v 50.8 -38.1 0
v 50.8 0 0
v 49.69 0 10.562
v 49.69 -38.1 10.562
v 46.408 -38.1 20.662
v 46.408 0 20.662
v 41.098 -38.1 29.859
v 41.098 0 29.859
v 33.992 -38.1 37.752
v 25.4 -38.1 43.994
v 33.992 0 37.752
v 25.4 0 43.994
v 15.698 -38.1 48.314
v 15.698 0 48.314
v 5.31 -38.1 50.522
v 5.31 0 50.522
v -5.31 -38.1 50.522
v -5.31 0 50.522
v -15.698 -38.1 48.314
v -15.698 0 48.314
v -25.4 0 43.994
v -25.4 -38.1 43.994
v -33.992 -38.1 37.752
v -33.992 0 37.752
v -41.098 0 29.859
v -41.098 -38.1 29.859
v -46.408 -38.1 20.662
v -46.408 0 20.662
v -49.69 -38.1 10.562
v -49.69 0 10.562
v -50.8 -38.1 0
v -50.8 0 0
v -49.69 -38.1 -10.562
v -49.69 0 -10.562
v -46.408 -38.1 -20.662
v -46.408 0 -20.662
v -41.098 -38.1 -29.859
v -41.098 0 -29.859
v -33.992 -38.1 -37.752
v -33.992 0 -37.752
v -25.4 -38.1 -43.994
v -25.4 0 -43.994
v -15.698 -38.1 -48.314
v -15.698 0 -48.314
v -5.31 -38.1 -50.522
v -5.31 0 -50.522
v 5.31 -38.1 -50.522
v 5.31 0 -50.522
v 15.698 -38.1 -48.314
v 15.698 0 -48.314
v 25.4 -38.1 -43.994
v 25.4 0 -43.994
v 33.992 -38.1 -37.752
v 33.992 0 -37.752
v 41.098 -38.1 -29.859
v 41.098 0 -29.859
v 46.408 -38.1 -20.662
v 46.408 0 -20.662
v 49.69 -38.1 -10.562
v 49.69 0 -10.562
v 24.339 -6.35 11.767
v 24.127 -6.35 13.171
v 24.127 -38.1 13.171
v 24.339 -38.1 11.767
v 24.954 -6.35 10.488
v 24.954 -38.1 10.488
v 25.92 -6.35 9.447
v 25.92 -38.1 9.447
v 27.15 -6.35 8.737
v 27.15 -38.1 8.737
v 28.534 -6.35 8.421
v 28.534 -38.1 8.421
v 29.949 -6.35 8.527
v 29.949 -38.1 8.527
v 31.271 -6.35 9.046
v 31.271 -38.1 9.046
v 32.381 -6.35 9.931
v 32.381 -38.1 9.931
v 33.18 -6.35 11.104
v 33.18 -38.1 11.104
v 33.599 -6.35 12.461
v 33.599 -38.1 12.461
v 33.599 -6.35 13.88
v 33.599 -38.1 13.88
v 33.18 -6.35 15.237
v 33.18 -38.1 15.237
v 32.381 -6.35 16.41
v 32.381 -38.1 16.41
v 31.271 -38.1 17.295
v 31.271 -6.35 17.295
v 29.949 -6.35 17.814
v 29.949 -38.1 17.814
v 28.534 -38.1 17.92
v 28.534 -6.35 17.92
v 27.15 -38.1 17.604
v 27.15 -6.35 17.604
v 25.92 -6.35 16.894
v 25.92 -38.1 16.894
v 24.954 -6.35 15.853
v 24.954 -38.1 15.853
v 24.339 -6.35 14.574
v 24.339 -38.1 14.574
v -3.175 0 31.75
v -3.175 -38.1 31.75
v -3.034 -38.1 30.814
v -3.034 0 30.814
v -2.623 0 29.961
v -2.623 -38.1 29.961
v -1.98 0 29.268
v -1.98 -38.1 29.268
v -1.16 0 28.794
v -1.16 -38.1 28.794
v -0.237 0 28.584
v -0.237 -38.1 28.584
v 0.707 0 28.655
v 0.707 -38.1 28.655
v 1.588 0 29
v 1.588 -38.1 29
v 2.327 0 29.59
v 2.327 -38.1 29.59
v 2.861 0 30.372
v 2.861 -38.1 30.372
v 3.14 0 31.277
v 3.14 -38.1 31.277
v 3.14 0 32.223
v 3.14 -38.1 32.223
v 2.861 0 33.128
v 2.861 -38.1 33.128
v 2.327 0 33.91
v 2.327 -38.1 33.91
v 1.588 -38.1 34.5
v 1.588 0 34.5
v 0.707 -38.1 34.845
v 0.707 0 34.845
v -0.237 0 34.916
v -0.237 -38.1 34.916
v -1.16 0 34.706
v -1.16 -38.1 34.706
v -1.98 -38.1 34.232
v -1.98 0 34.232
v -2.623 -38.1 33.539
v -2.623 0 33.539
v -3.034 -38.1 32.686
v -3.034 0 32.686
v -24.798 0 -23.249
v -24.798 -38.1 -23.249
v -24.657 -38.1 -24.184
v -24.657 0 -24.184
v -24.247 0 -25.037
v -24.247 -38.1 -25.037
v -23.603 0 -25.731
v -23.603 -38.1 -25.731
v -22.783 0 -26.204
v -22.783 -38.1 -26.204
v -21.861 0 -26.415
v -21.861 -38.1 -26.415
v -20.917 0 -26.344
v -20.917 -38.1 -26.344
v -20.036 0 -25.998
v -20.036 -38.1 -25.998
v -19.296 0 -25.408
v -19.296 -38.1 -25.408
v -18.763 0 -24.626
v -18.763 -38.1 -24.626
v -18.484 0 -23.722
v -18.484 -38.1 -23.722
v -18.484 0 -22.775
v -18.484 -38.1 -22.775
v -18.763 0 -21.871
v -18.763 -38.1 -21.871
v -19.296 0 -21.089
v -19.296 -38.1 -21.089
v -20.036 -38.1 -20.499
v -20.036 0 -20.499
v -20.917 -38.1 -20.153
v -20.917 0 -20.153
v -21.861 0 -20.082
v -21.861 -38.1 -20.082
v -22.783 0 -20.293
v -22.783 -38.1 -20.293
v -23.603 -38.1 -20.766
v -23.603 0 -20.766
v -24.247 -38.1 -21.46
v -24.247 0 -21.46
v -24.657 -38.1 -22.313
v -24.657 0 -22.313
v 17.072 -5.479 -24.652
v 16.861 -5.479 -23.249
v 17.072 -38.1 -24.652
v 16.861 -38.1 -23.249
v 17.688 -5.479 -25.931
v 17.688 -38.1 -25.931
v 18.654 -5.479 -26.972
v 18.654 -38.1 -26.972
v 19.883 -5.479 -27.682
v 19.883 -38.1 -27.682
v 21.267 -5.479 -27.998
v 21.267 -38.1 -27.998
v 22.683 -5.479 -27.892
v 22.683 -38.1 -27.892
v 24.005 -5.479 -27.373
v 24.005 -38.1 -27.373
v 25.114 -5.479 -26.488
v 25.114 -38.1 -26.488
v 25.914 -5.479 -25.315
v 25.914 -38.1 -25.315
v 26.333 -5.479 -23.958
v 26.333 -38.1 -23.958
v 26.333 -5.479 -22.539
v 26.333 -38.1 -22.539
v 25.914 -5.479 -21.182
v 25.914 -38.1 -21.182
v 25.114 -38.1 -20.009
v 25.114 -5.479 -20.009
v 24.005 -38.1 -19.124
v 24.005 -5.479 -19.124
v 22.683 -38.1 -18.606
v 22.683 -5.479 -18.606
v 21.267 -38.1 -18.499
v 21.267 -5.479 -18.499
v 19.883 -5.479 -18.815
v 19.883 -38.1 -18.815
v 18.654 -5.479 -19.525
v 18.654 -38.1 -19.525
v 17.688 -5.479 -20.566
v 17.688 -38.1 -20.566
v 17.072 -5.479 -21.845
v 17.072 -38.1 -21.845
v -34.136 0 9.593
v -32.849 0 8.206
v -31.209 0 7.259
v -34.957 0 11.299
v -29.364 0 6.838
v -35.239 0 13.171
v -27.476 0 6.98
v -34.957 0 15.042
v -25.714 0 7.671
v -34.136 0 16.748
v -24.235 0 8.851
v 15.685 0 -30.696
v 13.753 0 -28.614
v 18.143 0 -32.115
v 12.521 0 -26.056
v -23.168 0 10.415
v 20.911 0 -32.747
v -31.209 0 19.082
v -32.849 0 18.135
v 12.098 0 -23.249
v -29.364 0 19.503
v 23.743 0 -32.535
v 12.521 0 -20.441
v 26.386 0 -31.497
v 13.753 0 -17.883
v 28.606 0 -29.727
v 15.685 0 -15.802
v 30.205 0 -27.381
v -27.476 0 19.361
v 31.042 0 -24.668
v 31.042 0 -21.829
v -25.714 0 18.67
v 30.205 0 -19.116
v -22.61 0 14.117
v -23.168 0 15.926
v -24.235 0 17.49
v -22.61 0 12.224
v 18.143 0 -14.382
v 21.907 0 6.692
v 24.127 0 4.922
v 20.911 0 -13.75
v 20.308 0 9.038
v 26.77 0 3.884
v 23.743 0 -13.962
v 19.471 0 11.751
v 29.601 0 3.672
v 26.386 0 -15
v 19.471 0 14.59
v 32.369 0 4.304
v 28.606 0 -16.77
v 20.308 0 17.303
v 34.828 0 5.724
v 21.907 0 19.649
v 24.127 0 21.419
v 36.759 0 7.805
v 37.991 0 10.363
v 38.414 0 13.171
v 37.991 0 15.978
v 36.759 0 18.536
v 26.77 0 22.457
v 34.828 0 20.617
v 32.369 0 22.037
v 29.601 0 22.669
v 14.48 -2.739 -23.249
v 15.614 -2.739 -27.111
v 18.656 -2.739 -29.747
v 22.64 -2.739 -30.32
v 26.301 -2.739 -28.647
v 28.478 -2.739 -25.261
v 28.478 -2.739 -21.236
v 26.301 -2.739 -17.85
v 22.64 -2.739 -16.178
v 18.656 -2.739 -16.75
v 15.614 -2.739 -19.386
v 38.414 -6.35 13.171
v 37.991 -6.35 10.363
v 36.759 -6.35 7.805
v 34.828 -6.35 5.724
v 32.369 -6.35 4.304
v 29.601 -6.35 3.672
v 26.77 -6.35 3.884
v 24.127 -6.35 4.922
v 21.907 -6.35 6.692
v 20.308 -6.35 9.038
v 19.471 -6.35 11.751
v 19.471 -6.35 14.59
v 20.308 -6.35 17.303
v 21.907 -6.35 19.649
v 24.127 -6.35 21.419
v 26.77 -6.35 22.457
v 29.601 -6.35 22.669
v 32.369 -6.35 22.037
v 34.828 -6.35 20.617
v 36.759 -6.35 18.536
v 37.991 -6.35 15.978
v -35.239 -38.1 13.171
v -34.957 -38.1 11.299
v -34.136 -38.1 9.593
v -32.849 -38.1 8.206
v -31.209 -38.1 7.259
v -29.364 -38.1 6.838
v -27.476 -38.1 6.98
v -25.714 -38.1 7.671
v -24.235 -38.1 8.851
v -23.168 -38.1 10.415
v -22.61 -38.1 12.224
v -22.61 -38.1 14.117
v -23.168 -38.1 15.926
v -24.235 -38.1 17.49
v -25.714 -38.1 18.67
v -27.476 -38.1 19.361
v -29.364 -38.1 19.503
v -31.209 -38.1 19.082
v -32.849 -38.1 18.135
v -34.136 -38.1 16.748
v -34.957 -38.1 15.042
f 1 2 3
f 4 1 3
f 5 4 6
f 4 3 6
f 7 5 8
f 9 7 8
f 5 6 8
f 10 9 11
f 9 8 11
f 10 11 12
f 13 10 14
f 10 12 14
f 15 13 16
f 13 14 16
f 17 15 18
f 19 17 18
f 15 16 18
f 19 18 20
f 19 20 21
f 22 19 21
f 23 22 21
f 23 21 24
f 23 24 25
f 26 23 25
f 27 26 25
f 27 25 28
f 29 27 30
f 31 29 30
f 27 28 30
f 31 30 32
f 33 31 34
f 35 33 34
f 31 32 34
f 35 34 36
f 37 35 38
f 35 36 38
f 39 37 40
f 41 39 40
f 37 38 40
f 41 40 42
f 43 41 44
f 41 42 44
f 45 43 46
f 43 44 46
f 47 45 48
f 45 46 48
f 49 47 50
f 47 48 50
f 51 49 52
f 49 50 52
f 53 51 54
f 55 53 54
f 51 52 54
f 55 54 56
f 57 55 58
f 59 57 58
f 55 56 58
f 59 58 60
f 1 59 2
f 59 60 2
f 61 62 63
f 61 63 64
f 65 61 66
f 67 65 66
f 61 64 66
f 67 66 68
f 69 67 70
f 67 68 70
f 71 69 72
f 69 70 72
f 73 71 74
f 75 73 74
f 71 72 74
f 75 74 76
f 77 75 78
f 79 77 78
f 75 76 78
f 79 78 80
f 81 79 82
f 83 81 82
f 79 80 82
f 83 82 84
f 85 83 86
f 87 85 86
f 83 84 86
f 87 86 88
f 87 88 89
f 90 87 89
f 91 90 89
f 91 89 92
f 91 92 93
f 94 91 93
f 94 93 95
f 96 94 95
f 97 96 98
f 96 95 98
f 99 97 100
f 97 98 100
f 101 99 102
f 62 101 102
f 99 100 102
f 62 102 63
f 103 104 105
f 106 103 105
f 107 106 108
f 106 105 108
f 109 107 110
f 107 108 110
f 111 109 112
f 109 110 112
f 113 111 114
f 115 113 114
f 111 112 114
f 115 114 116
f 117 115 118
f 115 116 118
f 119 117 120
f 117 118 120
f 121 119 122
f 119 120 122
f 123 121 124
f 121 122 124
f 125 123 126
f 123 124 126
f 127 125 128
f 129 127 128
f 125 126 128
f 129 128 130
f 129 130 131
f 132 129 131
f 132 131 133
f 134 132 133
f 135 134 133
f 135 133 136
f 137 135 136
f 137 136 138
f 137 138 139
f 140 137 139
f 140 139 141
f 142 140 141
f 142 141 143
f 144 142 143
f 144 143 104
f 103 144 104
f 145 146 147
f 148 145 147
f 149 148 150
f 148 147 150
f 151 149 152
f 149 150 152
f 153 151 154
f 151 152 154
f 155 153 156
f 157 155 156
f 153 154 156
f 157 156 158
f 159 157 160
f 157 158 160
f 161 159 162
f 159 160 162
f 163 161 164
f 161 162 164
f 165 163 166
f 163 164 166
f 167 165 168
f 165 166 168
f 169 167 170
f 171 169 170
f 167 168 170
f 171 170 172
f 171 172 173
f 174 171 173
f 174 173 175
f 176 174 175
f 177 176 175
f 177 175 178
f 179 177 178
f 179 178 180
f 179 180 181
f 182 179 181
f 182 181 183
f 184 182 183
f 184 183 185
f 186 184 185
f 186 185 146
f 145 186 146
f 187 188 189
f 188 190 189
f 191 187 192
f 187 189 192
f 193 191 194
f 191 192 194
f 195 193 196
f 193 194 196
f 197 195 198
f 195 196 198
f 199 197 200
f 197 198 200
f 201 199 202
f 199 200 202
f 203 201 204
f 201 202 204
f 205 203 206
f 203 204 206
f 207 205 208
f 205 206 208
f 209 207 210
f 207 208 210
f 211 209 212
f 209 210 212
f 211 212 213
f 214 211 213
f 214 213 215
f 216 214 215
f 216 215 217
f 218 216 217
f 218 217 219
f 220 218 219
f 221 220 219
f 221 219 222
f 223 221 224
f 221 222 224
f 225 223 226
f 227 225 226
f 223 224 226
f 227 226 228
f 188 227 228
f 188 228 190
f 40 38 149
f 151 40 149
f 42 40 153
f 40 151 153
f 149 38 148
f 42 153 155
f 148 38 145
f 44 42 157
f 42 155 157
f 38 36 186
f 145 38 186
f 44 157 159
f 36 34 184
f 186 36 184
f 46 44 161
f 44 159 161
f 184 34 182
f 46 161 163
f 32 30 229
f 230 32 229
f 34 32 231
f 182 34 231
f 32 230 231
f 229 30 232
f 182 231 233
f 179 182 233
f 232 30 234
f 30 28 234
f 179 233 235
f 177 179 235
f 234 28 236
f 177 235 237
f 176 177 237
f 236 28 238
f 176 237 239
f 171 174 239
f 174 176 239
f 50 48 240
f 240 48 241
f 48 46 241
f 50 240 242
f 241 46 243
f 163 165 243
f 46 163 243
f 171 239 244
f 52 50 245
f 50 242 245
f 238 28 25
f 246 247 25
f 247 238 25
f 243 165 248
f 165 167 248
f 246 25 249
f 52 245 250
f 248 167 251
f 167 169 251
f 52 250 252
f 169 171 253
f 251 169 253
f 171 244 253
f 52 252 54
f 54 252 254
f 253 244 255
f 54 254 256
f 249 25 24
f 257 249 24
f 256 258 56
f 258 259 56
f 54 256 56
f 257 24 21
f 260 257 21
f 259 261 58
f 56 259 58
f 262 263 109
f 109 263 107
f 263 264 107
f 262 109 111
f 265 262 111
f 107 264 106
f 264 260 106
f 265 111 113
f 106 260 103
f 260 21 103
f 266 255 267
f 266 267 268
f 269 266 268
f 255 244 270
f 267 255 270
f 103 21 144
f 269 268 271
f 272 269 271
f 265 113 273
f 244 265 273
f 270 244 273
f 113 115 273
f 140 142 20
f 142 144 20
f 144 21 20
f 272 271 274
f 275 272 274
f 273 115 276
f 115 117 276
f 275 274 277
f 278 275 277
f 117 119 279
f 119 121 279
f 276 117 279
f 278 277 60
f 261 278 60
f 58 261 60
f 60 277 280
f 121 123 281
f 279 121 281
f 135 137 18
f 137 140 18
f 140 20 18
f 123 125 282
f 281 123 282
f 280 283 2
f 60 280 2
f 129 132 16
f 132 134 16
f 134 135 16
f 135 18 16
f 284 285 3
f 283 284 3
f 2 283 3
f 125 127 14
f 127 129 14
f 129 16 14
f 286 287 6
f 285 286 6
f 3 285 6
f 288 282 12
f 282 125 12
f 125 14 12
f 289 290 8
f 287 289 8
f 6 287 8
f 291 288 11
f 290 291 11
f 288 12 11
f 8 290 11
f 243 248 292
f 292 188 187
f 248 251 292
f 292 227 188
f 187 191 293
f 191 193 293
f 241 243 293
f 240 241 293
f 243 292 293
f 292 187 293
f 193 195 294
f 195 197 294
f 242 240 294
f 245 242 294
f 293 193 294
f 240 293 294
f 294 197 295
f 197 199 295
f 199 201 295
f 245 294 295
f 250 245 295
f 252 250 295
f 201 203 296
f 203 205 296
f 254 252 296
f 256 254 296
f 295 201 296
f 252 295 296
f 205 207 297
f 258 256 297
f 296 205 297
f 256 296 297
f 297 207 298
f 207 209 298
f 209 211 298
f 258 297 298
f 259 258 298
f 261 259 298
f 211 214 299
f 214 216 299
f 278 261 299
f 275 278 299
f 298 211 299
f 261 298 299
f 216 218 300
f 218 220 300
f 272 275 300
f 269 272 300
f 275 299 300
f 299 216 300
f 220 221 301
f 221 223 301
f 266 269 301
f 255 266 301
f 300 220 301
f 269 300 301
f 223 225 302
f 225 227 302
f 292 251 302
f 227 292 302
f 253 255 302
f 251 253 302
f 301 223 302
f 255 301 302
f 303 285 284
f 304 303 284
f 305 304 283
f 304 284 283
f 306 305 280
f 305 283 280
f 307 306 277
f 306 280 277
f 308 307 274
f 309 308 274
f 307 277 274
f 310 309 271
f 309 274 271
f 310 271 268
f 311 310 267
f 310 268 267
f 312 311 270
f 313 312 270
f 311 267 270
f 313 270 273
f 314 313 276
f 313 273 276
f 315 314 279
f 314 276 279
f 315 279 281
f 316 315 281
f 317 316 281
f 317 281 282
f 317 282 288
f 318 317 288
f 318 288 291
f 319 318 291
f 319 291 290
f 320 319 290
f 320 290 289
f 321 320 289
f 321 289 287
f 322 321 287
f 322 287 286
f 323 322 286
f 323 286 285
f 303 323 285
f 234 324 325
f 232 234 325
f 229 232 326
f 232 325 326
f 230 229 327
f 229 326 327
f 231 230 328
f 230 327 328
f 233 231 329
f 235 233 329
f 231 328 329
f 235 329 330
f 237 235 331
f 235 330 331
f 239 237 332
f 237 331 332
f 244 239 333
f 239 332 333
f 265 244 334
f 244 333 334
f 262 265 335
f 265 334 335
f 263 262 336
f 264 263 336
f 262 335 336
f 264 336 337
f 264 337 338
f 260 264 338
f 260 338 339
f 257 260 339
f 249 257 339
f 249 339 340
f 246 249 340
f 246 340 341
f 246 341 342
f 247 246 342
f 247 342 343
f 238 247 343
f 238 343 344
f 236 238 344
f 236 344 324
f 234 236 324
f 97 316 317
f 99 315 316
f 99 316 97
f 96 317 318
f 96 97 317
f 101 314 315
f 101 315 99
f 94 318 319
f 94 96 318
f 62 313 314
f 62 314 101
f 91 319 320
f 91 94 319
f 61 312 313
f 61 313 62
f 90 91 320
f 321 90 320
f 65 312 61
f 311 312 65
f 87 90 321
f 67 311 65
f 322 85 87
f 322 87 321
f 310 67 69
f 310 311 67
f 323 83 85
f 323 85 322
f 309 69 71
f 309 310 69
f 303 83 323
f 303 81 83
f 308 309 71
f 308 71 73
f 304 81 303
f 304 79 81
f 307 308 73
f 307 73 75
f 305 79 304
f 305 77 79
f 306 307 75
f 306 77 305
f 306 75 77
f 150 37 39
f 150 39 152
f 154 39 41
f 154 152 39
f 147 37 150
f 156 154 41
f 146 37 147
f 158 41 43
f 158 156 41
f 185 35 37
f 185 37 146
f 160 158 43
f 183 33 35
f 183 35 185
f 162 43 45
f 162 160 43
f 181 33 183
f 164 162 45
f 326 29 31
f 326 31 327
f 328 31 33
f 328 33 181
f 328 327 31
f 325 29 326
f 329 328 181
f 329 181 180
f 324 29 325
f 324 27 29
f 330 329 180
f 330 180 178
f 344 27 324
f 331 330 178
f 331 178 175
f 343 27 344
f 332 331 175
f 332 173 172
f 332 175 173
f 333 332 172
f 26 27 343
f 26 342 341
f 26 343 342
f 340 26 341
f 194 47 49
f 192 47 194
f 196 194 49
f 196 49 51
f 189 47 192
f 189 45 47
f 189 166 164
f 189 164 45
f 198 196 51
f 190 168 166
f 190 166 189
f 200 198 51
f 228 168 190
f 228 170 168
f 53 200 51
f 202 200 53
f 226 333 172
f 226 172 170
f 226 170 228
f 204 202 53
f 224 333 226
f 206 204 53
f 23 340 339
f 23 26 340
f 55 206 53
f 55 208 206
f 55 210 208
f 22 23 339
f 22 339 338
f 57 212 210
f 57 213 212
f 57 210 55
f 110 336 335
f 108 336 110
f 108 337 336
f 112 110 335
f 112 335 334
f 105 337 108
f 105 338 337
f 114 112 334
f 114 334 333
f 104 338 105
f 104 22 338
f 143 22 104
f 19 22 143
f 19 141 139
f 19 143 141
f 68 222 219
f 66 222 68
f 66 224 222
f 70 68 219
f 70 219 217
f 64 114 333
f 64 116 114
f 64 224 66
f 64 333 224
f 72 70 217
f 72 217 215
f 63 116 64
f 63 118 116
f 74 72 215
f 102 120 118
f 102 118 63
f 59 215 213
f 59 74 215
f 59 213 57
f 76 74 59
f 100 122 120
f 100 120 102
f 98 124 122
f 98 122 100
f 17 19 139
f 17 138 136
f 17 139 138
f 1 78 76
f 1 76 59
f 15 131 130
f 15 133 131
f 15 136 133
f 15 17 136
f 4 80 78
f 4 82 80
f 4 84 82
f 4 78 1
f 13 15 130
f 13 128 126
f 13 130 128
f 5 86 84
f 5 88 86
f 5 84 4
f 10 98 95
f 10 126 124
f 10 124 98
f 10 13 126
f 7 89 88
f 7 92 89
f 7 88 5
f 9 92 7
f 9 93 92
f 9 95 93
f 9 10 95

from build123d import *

# Parameters (mm, degrees)
F0_R           = 50.8
F1_DEPTH       = 38.1
F3_D           = 6.35
F4_D           = 12.7
F5_D           = 9.525
F5_CBORE_D     = 19.05
F5_CBORE_DEPTH = 6.35
F6_D           = 9.525
F6_CSINK_D     = 19.05
F6_CSINK_ANGLE = 82
F7_D           = 6.35


with BuildPart() as f1:
    # F0 (on Front) → F1 (new body)
    with BuildSketch(Plane.XZ):
        Circle(F0_R)
    extrude(amount=F1_DEPTH)

    # F3 (through all)
    with Locations(Plane(origin=(0, 0, 0), x_dir=(1, 0, 0), z_dir=(0, 1, 0))):
        with Locations((0, -31.75)):
            Hole(F3_D / 2)

    # F4 (through all)
    with Locations(Plane(origin=(0, 0, 0), x_dir=(1, 0, 0), z_dir=(0, 1, 0))):
        with Locations((-28.8894439592, -13.1705173676)):
            Hole(F4_D / 2)

    # F5 (through all)
    with Locations(Plane(origin=(0, 0, 0), x_dir=(1, 0, 0), z_dir=(0, 1, 0))):
        with Locations((28.8894439592, -13.1705173676)):
            CounterBoreHole(F5_D / 2, F5_CBORE_D / 2, F5_CBORE_DEPTH)

    # F6 (through all)
    with Locations(Plane(origin=(0, 0, 0), x_dir=(1, 0, 0), z_dir=(0, 1, 0))):
        with Locations((21.623259188, 23.2485948412)):
            CounterSinkHole(F6_D / 2, F6_CSINK_D / 2, counter_sink_angle=F6_CSINK_ANGLE)

    # F7 (through all)
    with Locations(Plane(origin=(0, 0, 0), x_dir=(1, 0, 0), z_dir=(0, 1, 0))):
        with Locations((-21.623259188, 23.2485948412)):
            Hole(F7_D / 2)


solid = f1.part
